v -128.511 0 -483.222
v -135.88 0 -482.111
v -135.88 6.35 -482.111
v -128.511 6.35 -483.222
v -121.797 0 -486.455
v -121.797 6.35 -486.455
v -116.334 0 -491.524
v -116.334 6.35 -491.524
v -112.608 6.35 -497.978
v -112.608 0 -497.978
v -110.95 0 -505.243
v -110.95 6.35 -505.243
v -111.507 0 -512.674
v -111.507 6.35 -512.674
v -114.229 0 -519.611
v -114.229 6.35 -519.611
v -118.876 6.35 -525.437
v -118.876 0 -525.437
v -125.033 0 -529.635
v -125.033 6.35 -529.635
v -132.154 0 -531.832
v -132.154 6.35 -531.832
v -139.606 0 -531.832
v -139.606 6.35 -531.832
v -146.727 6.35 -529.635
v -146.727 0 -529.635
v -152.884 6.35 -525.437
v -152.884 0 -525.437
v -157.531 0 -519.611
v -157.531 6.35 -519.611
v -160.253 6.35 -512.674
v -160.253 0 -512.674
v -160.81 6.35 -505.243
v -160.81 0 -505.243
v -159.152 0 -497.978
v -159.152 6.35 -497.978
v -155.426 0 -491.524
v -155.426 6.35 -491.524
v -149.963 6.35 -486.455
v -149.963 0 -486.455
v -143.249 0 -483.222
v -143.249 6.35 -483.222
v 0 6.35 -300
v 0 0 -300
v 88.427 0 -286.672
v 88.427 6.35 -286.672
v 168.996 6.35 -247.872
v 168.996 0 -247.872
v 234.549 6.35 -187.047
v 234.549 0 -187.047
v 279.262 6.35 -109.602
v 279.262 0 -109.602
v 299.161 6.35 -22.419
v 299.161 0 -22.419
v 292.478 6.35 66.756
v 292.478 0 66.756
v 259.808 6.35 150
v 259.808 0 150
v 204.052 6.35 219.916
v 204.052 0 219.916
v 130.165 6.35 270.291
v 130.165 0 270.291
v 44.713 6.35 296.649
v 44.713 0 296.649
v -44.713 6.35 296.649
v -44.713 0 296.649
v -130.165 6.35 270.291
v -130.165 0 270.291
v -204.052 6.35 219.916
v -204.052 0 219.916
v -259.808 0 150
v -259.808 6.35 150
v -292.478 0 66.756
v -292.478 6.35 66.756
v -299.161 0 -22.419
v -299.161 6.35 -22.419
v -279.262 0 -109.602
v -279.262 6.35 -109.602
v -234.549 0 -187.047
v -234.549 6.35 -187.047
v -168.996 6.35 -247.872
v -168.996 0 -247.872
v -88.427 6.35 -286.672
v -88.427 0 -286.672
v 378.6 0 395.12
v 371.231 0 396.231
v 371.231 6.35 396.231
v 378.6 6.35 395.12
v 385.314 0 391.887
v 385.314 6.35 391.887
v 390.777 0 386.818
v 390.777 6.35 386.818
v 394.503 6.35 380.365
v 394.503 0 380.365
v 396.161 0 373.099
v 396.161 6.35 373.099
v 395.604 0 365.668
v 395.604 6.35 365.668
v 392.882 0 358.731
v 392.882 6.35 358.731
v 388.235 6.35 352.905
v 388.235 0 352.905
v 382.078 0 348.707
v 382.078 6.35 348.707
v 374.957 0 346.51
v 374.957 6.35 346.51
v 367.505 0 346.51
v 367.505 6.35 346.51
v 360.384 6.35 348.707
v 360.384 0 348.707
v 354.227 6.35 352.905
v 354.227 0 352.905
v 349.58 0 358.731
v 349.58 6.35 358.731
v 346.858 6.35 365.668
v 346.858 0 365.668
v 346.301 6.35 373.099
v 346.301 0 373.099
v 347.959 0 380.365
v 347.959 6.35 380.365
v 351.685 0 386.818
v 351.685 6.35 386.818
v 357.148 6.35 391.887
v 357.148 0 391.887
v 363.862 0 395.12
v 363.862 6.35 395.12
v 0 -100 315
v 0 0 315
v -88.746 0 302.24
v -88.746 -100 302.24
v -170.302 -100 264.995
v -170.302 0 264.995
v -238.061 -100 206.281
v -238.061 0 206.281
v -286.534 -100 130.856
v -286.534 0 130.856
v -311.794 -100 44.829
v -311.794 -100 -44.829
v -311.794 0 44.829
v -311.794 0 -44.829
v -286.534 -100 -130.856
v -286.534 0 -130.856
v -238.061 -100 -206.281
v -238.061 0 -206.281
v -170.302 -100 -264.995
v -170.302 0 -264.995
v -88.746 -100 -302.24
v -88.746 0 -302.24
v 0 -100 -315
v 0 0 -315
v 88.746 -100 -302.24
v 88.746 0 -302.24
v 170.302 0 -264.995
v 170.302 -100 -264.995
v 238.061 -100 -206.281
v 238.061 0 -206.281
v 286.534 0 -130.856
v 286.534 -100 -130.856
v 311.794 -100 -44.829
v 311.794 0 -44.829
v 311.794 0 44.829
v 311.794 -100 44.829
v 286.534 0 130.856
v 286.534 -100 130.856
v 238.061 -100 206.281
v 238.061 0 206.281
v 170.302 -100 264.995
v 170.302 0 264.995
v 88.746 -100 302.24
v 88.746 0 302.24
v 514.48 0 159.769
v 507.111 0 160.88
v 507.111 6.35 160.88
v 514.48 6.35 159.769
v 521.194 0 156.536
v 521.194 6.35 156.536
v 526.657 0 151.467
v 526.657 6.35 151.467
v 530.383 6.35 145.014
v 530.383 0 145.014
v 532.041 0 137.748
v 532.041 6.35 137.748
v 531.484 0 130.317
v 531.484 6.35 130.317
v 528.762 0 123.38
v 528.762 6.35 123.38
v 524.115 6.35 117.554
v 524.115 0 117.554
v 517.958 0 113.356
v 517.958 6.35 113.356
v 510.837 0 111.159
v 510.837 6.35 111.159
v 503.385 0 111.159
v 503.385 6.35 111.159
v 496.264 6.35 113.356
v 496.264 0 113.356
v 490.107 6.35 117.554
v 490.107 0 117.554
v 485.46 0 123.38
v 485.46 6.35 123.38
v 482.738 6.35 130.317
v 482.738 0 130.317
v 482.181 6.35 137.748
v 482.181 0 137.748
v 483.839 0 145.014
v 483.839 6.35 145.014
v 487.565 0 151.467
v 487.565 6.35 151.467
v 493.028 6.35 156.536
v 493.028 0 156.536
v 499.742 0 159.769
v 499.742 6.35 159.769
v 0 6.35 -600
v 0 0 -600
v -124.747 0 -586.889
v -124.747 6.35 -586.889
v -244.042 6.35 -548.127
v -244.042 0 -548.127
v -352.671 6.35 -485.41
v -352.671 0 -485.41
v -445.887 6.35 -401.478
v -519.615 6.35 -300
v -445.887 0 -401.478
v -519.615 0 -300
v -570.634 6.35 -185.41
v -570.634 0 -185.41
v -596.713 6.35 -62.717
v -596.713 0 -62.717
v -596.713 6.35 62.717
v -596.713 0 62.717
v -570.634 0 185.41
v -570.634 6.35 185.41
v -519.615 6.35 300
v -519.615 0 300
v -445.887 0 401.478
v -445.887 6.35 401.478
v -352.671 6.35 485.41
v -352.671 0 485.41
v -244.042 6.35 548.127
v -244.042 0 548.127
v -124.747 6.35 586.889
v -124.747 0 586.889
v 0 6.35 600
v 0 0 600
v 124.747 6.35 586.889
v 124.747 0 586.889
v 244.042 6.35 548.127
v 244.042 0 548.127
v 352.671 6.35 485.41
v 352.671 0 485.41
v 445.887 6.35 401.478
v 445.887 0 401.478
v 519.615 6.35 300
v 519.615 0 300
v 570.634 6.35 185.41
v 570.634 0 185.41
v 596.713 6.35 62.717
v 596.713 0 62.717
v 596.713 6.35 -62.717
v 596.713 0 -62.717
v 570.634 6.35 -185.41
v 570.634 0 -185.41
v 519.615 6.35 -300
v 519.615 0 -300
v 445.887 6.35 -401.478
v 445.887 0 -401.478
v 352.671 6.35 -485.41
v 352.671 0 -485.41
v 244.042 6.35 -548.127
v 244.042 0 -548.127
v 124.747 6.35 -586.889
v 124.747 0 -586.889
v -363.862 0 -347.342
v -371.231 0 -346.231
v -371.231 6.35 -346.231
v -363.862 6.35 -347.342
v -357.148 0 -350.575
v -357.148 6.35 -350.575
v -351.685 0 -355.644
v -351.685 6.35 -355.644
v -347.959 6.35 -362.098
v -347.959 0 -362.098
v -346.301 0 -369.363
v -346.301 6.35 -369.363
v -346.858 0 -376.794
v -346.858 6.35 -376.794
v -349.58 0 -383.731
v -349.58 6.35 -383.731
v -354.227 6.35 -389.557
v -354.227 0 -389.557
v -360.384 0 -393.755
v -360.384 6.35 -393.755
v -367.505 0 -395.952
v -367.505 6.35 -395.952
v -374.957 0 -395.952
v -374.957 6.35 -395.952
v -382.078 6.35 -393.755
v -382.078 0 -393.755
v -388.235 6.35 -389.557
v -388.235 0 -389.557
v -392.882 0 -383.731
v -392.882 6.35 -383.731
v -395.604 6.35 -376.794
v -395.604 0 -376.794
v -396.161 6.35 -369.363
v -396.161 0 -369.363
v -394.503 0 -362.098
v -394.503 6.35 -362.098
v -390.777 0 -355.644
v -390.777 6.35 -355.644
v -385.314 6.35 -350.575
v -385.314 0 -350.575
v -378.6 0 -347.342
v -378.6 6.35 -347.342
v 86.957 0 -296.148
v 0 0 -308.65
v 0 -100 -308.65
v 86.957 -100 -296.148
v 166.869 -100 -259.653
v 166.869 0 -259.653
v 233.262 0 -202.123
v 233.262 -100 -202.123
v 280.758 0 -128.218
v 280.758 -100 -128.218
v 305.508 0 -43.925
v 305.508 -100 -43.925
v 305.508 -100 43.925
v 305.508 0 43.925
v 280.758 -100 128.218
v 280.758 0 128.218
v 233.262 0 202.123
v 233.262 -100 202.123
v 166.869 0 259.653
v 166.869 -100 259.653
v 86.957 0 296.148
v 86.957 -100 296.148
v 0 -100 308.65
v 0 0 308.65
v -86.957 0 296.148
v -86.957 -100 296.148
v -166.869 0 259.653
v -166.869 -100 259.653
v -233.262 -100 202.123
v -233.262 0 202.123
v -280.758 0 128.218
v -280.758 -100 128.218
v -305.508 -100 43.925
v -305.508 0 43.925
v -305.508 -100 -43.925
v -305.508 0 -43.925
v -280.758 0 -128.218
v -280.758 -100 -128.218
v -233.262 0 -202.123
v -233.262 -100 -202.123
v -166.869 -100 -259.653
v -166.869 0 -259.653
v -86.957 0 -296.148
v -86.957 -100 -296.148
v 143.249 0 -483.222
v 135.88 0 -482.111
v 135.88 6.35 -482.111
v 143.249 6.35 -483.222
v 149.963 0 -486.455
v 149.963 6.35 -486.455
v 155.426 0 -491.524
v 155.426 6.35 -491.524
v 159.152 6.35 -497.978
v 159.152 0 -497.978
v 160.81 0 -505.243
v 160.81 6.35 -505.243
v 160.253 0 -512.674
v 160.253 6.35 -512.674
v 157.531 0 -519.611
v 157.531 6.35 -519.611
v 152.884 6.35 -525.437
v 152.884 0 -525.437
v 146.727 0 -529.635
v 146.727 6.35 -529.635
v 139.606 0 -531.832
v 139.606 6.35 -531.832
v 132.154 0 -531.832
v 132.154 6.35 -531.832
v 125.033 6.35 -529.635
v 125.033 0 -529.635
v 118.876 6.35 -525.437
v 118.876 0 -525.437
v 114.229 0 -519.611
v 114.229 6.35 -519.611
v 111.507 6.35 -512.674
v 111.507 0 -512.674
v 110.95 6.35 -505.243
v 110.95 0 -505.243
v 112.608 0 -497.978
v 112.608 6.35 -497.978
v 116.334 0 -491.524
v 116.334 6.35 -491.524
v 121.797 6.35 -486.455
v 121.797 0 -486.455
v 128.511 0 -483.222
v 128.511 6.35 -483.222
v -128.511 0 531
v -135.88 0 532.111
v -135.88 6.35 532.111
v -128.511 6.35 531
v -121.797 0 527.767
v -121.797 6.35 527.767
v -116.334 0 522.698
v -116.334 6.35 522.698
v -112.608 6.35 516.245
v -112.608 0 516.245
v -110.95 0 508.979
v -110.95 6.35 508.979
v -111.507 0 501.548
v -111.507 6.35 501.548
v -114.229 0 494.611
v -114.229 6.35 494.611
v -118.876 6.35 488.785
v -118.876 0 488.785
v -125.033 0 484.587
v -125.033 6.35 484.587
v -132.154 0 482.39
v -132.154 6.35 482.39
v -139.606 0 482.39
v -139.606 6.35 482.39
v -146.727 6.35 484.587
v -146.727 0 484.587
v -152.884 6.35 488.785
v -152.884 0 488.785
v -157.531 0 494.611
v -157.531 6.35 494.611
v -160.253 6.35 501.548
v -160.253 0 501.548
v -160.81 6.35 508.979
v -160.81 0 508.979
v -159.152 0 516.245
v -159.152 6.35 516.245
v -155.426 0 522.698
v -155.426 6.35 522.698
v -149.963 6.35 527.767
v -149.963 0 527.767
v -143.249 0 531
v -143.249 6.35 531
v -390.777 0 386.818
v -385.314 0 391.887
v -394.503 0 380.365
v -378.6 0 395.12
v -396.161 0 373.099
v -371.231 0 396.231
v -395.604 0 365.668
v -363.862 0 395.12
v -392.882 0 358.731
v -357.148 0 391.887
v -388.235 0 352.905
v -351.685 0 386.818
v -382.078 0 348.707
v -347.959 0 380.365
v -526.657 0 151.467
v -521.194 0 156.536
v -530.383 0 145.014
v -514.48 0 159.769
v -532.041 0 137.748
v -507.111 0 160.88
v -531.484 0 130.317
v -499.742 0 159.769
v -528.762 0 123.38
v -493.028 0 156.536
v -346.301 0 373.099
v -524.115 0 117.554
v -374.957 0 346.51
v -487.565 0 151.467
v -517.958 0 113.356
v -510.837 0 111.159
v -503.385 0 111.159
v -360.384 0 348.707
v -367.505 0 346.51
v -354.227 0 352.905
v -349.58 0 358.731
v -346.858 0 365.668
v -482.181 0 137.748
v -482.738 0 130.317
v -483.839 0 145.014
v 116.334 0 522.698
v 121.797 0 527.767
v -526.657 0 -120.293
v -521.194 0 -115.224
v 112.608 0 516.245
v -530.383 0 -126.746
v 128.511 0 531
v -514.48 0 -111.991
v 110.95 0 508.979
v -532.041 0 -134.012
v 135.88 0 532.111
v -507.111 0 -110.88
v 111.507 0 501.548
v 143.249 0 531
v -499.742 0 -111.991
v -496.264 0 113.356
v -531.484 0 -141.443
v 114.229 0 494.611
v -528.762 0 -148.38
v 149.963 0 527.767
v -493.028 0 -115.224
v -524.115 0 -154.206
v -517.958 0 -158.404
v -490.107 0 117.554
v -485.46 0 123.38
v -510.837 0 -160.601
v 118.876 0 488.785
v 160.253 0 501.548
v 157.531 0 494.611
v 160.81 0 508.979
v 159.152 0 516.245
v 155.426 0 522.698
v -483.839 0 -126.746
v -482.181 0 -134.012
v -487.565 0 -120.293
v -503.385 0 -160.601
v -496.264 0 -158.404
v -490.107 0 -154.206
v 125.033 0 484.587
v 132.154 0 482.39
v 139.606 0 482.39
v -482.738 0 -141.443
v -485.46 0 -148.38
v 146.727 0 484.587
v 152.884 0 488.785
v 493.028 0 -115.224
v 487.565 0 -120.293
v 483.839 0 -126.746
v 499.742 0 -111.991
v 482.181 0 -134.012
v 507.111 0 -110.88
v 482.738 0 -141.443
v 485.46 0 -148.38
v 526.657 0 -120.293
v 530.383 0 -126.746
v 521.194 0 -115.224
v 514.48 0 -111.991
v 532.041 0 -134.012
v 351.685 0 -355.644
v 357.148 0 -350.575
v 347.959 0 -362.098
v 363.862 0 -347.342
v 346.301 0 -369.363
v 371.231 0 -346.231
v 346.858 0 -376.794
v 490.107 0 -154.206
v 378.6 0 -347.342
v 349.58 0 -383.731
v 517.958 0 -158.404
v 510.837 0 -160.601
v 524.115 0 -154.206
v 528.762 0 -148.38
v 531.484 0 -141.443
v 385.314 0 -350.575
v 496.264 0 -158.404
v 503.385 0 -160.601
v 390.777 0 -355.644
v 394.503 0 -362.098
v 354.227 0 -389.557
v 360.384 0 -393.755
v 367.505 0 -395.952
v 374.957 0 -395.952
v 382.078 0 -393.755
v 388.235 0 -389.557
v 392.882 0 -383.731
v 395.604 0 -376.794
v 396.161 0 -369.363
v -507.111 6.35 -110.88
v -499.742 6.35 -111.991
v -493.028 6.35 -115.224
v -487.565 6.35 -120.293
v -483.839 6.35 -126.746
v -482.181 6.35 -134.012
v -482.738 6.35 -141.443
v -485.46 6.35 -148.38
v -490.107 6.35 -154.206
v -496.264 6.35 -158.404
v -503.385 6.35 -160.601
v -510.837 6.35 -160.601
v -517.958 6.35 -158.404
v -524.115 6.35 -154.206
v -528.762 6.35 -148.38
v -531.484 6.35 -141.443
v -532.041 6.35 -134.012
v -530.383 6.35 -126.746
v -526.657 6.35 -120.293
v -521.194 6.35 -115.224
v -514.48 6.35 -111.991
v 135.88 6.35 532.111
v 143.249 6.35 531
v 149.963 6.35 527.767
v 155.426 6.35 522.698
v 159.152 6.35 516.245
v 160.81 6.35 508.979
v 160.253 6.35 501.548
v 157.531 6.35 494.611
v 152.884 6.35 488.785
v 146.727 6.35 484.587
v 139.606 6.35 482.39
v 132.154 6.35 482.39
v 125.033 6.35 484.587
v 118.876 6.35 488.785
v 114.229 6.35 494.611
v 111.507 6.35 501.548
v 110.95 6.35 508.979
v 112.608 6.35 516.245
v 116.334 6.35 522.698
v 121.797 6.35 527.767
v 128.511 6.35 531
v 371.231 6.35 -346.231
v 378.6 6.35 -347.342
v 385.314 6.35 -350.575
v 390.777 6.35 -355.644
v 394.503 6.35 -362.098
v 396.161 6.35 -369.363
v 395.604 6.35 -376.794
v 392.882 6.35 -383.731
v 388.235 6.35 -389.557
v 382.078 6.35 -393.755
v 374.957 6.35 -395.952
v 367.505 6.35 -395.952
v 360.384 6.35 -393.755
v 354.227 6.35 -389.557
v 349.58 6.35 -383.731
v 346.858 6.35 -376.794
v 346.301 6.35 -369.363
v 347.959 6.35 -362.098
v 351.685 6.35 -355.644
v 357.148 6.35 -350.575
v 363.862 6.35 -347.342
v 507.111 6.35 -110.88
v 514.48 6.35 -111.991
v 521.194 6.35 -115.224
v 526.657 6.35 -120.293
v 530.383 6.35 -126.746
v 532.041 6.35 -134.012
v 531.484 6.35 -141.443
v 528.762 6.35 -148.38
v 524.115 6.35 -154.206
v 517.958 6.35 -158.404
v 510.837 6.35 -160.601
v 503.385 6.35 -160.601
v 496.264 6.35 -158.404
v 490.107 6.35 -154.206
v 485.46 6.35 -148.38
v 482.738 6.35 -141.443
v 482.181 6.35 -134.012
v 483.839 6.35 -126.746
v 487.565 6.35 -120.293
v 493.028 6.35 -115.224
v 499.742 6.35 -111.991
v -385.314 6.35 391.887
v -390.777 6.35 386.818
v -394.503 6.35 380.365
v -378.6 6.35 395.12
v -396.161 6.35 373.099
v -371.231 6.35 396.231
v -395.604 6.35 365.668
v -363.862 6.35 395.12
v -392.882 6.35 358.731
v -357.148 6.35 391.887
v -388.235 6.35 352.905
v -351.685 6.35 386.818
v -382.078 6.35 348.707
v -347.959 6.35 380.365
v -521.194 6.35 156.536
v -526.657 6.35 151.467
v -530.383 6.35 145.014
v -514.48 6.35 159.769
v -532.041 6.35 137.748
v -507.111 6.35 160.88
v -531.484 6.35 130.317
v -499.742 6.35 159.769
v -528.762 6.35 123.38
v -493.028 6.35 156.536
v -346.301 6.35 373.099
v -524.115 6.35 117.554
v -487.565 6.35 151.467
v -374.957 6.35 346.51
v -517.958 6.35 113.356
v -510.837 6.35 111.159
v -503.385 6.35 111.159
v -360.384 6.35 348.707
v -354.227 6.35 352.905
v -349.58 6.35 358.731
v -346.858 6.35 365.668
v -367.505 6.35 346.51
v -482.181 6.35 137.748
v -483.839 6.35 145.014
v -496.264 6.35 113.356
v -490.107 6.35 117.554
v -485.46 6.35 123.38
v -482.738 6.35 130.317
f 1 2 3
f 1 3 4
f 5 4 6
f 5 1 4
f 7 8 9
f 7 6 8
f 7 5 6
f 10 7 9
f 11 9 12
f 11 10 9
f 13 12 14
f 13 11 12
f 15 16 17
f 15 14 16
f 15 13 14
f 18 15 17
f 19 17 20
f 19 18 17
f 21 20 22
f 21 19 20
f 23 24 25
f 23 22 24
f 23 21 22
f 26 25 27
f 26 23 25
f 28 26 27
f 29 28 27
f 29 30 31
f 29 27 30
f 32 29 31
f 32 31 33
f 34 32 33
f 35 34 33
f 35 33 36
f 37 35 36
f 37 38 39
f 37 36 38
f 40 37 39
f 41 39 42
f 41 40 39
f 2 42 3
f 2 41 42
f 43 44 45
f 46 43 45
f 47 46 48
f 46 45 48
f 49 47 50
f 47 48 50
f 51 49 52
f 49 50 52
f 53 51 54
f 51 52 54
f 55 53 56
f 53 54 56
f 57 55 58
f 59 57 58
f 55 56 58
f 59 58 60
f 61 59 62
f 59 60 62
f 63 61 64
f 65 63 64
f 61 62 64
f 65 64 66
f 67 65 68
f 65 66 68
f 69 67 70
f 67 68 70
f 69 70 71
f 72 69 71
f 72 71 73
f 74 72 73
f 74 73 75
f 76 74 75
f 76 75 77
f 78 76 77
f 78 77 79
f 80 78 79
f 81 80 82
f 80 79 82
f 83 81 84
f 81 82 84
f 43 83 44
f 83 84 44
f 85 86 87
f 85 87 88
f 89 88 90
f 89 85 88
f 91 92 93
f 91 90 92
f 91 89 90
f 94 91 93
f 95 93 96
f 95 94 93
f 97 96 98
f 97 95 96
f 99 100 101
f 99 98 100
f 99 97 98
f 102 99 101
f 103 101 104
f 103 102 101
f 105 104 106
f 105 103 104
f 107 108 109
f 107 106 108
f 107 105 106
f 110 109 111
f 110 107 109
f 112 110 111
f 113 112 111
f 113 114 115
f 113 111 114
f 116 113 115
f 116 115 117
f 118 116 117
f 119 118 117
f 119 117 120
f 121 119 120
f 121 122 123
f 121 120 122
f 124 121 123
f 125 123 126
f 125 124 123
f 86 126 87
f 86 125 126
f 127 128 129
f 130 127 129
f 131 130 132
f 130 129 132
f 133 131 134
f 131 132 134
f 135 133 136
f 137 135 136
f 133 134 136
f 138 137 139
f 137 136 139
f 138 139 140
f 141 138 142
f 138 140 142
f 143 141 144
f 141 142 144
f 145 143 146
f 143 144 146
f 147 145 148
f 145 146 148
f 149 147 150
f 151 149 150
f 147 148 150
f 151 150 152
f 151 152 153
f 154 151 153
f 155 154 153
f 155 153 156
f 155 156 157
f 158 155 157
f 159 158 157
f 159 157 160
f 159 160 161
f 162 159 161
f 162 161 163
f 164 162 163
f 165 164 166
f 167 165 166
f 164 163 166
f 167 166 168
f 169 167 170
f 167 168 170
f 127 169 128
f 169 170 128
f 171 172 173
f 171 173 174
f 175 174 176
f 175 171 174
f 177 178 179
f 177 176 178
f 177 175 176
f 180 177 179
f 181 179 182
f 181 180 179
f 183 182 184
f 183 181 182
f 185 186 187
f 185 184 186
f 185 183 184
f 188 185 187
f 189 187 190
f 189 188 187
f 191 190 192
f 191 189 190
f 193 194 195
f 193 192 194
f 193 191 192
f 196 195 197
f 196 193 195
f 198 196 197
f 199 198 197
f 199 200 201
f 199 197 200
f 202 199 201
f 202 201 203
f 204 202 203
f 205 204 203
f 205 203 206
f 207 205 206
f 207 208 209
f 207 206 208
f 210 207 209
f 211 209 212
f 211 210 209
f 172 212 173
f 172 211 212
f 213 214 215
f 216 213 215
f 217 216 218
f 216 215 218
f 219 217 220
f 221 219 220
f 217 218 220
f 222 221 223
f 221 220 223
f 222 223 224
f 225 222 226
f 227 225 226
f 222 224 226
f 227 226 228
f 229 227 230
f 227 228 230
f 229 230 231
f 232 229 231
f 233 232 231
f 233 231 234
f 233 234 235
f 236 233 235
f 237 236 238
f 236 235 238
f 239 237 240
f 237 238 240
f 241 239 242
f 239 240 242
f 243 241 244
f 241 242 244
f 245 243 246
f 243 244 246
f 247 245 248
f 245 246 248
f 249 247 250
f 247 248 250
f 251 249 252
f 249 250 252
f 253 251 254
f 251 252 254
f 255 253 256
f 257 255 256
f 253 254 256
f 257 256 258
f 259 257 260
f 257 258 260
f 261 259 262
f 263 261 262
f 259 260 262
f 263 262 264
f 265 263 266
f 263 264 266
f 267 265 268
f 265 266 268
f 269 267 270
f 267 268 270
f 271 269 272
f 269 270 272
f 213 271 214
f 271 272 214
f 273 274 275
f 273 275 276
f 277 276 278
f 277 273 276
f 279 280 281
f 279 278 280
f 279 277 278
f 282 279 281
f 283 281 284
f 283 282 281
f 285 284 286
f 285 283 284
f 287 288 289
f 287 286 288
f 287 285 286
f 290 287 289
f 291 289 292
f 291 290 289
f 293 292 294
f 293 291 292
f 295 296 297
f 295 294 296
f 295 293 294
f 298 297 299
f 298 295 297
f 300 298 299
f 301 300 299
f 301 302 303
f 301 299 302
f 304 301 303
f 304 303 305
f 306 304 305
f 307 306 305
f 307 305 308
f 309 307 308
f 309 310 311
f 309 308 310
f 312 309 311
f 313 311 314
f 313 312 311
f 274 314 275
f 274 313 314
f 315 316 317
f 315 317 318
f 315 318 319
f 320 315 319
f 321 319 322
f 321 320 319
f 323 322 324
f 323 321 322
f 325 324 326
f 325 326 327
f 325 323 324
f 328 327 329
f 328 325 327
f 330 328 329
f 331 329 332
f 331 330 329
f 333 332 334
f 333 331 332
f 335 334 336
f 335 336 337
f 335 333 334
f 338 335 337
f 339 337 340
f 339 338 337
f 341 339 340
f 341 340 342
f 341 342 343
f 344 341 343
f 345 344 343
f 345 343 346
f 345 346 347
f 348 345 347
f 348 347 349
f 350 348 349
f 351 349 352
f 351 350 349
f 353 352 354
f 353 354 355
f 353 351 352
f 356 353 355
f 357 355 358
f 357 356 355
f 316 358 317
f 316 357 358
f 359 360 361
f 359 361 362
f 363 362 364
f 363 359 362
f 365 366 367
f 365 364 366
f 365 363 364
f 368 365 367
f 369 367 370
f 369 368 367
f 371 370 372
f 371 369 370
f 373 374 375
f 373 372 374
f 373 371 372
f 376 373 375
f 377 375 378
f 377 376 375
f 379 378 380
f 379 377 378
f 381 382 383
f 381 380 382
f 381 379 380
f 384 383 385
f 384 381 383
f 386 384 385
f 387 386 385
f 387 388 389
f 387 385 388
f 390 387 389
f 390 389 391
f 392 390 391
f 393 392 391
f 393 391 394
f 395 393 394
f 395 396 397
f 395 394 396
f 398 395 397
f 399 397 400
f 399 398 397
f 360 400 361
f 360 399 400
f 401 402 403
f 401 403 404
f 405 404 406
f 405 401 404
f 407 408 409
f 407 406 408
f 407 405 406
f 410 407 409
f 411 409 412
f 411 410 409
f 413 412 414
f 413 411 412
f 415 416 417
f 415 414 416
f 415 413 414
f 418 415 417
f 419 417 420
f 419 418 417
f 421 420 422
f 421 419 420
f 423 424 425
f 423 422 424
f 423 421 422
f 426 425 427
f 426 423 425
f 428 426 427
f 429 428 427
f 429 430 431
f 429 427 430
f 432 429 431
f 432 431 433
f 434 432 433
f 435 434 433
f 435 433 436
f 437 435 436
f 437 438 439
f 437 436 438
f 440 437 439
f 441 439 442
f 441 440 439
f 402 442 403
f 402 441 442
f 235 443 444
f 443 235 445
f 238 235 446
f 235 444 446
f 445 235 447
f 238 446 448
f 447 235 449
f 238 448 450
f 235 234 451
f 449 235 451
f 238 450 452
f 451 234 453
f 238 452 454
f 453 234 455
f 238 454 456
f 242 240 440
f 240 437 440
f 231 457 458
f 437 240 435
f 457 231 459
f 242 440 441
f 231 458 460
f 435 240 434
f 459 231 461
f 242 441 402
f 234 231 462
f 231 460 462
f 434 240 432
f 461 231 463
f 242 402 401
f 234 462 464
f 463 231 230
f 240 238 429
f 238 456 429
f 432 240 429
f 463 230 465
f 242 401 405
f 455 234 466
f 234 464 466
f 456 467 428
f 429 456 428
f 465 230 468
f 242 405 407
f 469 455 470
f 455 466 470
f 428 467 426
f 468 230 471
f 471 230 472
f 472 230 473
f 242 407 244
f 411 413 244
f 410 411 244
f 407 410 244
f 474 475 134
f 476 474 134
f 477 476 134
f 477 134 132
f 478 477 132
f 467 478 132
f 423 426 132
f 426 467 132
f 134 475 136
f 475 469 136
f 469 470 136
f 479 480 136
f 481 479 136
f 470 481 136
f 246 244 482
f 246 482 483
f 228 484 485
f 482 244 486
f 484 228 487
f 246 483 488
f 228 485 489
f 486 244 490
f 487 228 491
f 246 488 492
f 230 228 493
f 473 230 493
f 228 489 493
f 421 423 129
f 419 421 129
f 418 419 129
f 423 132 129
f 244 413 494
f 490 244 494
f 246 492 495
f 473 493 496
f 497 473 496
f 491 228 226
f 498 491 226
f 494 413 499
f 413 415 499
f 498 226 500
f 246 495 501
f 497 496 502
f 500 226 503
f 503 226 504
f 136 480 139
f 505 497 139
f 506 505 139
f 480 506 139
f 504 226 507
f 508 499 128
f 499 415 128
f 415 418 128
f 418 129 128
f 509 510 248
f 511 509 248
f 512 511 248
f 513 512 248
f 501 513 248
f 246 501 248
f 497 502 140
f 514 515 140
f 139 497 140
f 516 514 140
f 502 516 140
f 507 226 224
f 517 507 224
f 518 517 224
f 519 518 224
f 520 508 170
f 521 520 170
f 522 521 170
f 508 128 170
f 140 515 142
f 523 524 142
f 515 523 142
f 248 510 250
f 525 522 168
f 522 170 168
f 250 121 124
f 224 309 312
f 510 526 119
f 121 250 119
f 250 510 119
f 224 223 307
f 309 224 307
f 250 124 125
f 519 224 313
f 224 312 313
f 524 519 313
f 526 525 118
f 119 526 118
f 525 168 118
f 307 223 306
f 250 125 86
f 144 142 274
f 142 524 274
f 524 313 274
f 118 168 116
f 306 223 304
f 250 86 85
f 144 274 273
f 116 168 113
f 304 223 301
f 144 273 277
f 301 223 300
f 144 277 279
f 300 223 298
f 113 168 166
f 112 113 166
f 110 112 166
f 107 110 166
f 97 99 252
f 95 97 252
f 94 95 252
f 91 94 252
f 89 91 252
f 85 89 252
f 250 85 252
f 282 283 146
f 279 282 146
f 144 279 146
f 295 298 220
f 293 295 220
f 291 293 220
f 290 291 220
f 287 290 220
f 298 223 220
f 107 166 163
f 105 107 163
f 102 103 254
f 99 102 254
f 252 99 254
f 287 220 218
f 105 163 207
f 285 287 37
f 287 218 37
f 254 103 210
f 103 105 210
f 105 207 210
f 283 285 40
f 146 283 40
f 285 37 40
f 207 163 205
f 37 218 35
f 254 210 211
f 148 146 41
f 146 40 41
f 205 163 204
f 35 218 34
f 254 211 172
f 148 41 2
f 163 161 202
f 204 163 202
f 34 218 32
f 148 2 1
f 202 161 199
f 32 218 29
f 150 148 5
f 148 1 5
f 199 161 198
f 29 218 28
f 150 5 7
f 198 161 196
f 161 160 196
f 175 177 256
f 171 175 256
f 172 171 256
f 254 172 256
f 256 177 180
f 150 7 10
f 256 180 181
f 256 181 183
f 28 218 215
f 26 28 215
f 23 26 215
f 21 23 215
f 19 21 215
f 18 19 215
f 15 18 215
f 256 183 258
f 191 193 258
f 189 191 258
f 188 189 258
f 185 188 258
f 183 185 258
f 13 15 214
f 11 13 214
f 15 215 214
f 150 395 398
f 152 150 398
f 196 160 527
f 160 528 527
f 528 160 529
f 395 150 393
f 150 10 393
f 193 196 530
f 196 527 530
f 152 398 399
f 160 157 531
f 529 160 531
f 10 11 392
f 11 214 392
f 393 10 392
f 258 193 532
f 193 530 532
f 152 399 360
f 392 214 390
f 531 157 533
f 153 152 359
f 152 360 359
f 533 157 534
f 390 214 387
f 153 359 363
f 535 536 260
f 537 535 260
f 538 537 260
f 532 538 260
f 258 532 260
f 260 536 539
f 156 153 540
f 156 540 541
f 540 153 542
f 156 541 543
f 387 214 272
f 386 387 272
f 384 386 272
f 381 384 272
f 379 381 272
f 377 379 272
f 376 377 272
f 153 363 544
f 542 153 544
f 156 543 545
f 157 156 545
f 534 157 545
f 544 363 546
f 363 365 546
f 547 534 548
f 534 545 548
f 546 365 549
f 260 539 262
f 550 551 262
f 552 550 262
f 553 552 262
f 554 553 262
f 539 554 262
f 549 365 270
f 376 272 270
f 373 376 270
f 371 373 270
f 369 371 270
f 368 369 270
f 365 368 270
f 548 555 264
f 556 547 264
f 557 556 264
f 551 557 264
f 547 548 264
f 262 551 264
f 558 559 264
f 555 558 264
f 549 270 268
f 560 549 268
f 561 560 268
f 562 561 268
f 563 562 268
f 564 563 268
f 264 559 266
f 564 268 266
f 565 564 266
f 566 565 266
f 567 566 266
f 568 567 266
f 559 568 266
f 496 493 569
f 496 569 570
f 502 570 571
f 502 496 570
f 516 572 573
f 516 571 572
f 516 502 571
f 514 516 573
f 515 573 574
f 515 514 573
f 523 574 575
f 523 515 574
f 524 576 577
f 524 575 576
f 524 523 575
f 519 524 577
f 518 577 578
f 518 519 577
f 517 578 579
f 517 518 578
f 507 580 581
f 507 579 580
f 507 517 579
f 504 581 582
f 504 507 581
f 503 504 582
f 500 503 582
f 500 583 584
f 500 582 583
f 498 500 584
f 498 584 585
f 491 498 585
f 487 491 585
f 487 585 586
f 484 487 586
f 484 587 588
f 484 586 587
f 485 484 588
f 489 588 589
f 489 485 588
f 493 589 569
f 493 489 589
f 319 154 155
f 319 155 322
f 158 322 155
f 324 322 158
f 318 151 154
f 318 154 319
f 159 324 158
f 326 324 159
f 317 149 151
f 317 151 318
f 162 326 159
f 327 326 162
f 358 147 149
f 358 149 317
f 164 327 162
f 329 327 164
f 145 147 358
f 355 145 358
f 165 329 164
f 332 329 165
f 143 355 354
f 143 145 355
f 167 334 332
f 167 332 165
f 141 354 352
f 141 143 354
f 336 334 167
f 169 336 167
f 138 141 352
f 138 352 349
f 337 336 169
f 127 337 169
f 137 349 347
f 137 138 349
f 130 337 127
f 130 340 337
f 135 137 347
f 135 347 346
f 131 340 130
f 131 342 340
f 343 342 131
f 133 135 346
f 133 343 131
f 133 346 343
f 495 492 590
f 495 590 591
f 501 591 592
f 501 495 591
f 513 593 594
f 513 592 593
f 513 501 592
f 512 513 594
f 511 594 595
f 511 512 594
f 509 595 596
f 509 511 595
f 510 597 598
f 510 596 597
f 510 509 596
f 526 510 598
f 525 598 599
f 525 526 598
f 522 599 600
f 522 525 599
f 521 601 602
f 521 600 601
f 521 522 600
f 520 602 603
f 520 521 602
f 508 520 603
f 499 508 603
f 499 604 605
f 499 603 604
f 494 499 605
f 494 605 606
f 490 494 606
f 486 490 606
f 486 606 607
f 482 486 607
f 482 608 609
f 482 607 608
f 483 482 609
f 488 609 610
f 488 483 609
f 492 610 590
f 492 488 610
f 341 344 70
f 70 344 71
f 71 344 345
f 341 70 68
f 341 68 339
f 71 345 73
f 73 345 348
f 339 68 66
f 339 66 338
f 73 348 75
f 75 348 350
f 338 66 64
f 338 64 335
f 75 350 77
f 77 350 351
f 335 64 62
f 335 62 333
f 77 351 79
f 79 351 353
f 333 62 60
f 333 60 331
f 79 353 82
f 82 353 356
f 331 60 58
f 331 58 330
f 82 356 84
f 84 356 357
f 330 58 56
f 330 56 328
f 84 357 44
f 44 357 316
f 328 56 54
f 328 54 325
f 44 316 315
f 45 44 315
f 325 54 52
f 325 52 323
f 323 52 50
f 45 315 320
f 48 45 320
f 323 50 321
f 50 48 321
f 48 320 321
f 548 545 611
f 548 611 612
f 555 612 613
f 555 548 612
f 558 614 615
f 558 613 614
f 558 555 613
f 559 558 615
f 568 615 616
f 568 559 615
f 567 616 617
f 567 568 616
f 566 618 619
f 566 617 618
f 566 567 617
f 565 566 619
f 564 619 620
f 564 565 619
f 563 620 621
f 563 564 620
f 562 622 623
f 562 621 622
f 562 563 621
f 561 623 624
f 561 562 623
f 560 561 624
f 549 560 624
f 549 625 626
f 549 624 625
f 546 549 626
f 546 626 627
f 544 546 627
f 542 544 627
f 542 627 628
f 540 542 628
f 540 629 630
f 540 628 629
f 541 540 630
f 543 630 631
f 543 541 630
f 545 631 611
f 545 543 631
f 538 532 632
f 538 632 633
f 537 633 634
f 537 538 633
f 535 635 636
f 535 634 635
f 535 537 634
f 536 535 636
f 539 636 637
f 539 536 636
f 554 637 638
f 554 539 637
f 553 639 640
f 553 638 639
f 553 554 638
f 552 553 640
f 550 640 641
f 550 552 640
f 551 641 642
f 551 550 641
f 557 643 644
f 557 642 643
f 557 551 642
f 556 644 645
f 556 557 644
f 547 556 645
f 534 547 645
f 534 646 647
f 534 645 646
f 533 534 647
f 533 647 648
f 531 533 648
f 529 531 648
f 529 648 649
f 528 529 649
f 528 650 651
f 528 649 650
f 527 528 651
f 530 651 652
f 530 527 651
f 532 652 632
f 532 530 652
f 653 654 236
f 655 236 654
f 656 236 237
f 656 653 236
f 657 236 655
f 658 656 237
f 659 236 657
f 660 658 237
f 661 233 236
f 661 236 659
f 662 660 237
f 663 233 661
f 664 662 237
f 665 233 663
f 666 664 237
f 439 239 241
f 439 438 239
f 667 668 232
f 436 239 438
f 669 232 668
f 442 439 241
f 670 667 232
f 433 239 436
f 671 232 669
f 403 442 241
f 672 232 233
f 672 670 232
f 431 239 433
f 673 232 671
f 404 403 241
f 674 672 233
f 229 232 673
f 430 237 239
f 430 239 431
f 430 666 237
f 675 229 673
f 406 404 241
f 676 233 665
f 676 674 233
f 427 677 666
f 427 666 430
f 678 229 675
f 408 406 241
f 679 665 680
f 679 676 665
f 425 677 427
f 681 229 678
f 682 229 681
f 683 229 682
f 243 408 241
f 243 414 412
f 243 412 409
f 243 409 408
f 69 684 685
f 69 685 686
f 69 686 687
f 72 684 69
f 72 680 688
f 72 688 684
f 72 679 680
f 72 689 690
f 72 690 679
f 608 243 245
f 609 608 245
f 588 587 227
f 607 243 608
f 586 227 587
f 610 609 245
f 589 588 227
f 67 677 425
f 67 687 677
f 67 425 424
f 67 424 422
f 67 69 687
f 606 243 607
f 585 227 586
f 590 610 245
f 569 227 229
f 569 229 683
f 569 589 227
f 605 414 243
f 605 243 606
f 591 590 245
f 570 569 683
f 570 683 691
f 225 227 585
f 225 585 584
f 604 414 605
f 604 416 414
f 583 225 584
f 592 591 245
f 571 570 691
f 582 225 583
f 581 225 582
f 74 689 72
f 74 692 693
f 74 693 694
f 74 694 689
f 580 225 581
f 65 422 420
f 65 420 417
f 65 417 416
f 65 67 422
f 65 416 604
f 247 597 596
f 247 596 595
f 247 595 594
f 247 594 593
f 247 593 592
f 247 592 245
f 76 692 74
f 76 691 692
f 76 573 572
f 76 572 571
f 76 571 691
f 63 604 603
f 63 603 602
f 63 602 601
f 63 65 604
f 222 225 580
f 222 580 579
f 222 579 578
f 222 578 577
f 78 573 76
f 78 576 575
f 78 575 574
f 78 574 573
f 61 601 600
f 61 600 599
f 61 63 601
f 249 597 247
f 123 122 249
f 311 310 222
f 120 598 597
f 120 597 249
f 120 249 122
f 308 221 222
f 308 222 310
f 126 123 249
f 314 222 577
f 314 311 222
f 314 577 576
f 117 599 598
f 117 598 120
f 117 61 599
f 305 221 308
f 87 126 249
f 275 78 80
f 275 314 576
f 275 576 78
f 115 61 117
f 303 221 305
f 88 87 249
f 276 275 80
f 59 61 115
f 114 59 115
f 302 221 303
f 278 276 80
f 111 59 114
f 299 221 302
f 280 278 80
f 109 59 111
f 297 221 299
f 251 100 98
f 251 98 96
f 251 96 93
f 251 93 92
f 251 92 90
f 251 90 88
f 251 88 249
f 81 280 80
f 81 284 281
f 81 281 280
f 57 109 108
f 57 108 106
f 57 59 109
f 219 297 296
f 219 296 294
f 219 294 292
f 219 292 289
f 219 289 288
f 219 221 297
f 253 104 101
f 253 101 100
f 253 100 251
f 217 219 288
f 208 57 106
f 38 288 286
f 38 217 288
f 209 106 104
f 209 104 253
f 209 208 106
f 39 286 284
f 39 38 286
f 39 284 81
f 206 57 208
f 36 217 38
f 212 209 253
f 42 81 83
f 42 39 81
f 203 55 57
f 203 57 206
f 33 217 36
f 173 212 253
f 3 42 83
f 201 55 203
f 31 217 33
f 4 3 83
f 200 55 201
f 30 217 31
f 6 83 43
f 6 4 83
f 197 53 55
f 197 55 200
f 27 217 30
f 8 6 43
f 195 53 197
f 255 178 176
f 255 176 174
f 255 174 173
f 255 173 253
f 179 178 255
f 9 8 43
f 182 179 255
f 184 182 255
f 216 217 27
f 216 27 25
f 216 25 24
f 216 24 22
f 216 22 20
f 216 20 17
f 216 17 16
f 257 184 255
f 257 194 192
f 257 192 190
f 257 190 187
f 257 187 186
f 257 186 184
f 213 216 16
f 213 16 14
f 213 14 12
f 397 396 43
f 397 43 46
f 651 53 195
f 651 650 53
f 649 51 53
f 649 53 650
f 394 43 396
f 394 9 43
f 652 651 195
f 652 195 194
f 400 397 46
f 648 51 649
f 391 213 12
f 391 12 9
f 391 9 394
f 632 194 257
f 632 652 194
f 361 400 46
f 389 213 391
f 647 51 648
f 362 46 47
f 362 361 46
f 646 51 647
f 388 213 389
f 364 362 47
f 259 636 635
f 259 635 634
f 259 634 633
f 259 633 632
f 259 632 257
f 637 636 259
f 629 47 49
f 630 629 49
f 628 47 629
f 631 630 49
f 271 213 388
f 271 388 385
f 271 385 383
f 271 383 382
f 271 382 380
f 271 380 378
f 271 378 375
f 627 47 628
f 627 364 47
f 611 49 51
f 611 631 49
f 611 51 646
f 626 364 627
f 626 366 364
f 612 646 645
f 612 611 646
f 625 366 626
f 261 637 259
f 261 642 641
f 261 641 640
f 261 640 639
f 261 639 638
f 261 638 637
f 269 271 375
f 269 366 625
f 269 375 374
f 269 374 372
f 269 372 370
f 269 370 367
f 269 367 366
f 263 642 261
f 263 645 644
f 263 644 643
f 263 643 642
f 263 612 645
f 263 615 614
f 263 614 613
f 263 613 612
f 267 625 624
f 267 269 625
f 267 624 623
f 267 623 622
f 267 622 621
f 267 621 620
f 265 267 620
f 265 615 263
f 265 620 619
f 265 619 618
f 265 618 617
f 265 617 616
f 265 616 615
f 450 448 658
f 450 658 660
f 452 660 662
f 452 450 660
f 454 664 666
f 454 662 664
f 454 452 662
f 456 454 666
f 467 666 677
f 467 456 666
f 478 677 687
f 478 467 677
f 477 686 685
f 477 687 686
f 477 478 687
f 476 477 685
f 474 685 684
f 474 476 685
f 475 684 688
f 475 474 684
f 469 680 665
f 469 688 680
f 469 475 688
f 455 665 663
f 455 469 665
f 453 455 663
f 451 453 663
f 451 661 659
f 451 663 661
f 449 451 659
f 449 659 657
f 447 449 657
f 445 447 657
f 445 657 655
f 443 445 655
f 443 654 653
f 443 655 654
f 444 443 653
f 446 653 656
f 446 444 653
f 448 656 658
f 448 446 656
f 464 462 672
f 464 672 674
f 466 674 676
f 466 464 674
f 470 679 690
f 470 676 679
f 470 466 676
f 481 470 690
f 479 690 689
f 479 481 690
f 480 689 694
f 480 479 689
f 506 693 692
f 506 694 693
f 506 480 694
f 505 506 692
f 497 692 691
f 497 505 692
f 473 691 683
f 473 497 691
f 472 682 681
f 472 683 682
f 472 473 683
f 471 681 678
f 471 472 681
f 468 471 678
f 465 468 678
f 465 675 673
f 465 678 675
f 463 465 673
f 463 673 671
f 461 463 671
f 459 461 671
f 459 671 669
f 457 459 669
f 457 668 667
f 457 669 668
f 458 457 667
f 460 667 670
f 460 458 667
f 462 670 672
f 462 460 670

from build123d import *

# Parameters (mm, degrees)
BOSS_EXTRUDE1_DEPTH     = 6.35
CUT_EXTRUDE1_DEPTH      = 849.551897352
CUT_EXTRUDE1_DEPTH_BACK = 849.551897352
SKETCH2_R               = 25
SKETCH3_R               = 315
SKETCH3_R_2             = 308.65
BOSS_EXTRUDE2_DEPTH     = 100


with BuildPart() as part:
    # Sketch1 → Boss-Extrude1 (new body)
    with BuildSketch(Plane(origin=(0, 0, 0), x_dir=(1, 0, 0), z_dir=(0, 1, 0))):
        with BuildLine():
            Line((0, 450), (0, 300))
            ThreePointArc((0, 300), (212.132034356, 212.132034356), (300, 0))
            ThreePointArc((300, 0), (212.132034356, -212.132034356), (0, -300))
            Line((0, -300), (0, -450))
            ThreePointArc((0, -450), (318.198051534, -318.198051534), (450, 0))
            ThreePointArc((450, 0), (318.198051534, 318.198051534), (0, 450))
        make_face()
        with BuildLine():
            ThreePointArc((0, -450), (-450, 0), (0, 450))
            Line((0, 450), (0, 600))
            ThreePointArc((0, 600), (-600, 0), (0, -600))
            Line((0, -600), (0, -450))
        make_face()
        with BuildLine():
            Line((0, 600), (0, 450))
            ThreePointArc((0, 450), (318.198051534, 318.198051534), (450, 0))
            ThreePointArc((450, 0), (318.198051534, -318.198051534), (0, -450))
            Line((0, -450), (0, -600))
            ThreePointArc((0, -600), (424.264068712, -424.264068712), (600, 0))
            ThreePointArc((600, 0), (424.264068712, 424.264068712), (0, 600))
        make_face()
        with BuildLine():
            ThreePointArc((0, -300), (-300, 0), (0, 300))
            Line((0, 300), (0, 450))
            ThreePointArc((0, 450), (-450, 0), (0, -450))
            Line((0, -450), (0, -300))
        make_face()
    extrude(amount=BOSS_EXTRUDE1_DEPTH)

    # Sketch2 → Cut-Extrude1 (cut, two sides: drawn at the far end of the back side and taken through both)
    with BuildSketch(Plane(origin=(0, 6.35, 0), x_dir=(1, 0, 0), z_dir=(0, 1, 0)).offset(-CUT_EXTRUDE1_DEPTH_BACK)):
        with Locations(Location((135.879998679, 507.111058802, 0), (0, 0, 270))):
            Circle(SKETCH2_R)
        with Locations(Location((-135.879998679, 507.111058802, 0), (0, 0, 270))):
            Circle(SKETCH2_R)
        with Locations(Location((371.231060123, 371.231060123, 0), (0, 0, 270))):
            Circle(SKETCH2_R)
        with Locations(Location((507.111058802, 135.879998679, 0), (0, 0, 270))):
            Circle(SKETCH2_R)
        with Locations(Location((507.111058802, -135.879998679, 0), (0, 0, 270))):
            Circle(SKETCH2_R)
        with Locations(Location((371.231060123, -371.231060123, 0), (0, 0, 270))):
            Circle(SKETCH2_R)
        with Locations(Location((135.879998679, -507.111058802, 0), (0, 0, 270))):
            Circle(SKETCH2_R)
        with Locations(Location((-371.231060123, 371.231060123, 0), (0, 0, 270))):
            Circle(SKETCH2_R)
        with Locations(Location((-507.111058802, 135.879998679, 0), (0, 0, 270))):
            Circle(SKETCH2_R)
        with Locations(Location((-507.111058802, -135.879998679, 0), (0, 0, 270))):
            Circle(SKETCH2_R)
        with Locations(Location((-371.231060123, -371.231060123, 0), (0, 0, 270))):
            Circle(SKETCH2_R)
        with Locations(Location((-135.879998679, -507.111058802, 0), (0, 0, 270))):
            Circle(SKETCH2_R)
    extrude(amount=CUT_EXTRUDE1_DEPTH + CUT_EXTRUDE1_DEPTH_BACK, mode=Mode.SUBTRACT)

    # Sketch3 → Boss-Extrude2 (add)
    with BuildSketch(Plane.XZ):
        with Locations(Location((0, 0, 0), (0, 0, 90))):
            Circle(SKETCH3_R)
        with Locations(Location((0, 0, 0), (0, 0, 270))):
            Circle(SKETCH3_R_2, mode=Mode.SUBTRACT)
    extrude(amount=BOSS_EXTRUDE2_DEPTH)


solid = part.part
